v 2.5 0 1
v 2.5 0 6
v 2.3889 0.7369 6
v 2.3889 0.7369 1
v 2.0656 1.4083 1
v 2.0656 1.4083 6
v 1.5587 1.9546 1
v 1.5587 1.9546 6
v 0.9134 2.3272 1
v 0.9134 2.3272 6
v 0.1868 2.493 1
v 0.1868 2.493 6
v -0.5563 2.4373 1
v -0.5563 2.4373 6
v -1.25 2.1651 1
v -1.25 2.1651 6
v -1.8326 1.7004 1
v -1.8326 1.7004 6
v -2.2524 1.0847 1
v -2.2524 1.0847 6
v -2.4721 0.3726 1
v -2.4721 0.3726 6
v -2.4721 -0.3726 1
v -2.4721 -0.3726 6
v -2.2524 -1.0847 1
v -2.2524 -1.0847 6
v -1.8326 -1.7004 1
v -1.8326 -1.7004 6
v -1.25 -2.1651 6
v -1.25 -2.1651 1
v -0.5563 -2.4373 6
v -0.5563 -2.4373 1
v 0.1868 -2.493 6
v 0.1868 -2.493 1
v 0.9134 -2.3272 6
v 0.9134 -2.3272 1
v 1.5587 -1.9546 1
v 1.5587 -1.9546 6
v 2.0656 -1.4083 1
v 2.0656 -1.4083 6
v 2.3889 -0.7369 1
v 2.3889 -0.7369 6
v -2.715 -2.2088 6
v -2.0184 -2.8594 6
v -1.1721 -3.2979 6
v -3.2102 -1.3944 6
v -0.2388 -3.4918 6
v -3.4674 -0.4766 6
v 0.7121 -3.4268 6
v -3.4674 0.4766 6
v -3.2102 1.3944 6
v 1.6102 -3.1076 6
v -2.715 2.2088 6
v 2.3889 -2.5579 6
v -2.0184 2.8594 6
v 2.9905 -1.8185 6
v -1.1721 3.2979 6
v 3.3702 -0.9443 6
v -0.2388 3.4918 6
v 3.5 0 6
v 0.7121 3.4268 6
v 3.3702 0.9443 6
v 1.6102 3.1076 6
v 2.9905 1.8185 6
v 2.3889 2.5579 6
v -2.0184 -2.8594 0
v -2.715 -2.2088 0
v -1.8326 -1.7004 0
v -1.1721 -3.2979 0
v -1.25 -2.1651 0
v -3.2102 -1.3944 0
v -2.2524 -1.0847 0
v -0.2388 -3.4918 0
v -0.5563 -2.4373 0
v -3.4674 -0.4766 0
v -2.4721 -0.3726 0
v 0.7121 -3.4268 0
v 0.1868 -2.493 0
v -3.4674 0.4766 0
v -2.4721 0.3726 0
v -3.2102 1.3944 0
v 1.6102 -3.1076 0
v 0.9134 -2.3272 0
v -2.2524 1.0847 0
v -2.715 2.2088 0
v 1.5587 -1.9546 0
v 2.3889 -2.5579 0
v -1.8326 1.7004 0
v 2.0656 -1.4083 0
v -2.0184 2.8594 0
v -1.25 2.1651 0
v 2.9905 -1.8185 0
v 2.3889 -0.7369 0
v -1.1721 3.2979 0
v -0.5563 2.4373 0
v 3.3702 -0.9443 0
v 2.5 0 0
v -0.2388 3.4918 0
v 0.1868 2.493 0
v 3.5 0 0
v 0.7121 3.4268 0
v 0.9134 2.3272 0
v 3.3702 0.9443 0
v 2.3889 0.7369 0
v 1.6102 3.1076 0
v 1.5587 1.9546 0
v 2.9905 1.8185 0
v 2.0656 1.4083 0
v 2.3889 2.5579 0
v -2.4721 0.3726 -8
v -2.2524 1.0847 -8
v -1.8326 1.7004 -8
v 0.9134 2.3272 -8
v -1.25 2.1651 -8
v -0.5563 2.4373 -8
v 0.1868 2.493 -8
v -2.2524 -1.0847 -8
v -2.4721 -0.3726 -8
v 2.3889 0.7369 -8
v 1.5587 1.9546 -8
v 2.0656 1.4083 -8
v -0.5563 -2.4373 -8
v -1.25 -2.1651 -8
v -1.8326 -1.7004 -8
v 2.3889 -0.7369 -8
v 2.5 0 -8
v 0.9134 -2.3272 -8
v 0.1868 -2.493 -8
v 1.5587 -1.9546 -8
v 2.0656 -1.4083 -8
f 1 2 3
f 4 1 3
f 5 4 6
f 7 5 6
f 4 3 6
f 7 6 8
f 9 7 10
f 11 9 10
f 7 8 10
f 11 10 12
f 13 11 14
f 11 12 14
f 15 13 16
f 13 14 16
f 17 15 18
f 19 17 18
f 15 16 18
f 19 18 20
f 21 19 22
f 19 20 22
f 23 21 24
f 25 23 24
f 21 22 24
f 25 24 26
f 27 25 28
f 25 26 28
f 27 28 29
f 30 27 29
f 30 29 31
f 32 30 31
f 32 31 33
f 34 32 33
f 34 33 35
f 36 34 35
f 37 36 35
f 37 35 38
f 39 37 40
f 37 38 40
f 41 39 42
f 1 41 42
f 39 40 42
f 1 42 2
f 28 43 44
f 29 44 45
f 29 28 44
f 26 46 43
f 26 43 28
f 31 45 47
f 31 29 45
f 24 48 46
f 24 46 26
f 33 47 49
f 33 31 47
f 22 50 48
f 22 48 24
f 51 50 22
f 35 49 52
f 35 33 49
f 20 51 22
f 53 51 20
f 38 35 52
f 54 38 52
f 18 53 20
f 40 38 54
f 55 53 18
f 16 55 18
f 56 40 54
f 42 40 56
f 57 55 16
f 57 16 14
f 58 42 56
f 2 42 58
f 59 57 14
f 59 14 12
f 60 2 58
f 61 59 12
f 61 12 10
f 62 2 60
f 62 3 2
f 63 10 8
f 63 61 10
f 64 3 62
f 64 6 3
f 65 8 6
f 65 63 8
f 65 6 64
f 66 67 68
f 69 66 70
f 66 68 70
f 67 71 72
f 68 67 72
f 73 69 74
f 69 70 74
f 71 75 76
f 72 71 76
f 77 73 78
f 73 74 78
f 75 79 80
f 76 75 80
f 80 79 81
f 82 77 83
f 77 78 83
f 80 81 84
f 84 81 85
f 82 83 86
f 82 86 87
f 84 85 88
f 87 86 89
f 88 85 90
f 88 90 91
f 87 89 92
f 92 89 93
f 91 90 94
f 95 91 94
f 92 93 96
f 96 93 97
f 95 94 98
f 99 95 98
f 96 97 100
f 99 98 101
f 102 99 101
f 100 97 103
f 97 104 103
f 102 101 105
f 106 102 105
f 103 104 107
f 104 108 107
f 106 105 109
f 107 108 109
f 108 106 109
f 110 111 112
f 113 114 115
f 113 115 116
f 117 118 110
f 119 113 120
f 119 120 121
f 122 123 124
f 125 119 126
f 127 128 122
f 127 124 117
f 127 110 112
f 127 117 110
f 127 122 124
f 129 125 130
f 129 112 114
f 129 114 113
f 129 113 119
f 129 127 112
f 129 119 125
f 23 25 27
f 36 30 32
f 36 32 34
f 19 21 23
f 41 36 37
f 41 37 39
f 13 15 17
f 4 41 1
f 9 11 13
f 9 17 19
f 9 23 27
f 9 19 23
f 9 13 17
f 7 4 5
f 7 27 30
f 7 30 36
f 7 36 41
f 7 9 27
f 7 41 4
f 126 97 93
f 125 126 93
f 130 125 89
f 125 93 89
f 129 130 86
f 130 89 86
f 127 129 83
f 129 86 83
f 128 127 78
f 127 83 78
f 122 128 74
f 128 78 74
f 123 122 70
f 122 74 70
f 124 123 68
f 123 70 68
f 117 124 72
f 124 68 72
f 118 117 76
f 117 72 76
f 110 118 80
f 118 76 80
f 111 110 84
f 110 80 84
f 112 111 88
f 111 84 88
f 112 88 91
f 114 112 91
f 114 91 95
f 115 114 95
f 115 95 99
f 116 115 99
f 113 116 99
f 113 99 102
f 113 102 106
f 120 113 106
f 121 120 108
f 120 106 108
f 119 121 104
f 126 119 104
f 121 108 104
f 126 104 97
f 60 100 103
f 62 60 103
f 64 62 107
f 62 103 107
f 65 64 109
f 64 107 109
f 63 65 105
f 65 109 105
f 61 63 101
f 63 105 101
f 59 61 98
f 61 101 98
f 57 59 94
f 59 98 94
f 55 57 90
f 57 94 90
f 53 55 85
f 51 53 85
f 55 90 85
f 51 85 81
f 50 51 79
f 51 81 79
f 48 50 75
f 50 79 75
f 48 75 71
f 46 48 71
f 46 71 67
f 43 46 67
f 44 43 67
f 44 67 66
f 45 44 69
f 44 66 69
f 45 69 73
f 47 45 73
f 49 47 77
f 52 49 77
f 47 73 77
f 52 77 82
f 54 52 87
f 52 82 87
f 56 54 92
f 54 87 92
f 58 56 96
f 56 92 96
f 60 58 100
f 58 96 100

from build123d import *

# Parameters (mm, degrees)
ESQUISSE1_R             = 3.5
BOSS_EXTRU_2_DEPTH      = 6
ESQUISSE3_R             = 2.5
ENL_V_MAT_EXTRU_1_DEPTH = 5
ESQUISSE4_R             = 2.5
BOSS_EXTRU_3_DEPTH      = 8


with BuildPart() as part:
    # Esquisse1 → Boss.-Extru.2 (new body)
    with BuildSketch(Plane.XY):
        Circle(ESQUISSE1_R)
    extrude(amount=BOSS_EXTRU_2_DEPTH)

    # Esquisse3 → Enlèv. mat.-Extru.1 (cut)
    with BuildSketch(Plane.XY.offset(6)):
        Circle(ESQUISSE3_R)
    extrude(amount=-ENL_V_MAT_EXTRU_1_DEPTH, mode=Mode.SUBTRACT)

    # Esquisse4 → Boss.-Extru.3 (add)
    with BuildSketch(Plane(origin=(0, 0, 0), x_dir=(-1, 0, 0), z_dir=(0, 0, -1))):
        with Locations(Location((0, 0, 0), (0, 0, 180))):
            Circle(ESQUISSE4_R)
    extrude(amount=BOSS_EXTRU_3_DEPTH)


solid = part.part
